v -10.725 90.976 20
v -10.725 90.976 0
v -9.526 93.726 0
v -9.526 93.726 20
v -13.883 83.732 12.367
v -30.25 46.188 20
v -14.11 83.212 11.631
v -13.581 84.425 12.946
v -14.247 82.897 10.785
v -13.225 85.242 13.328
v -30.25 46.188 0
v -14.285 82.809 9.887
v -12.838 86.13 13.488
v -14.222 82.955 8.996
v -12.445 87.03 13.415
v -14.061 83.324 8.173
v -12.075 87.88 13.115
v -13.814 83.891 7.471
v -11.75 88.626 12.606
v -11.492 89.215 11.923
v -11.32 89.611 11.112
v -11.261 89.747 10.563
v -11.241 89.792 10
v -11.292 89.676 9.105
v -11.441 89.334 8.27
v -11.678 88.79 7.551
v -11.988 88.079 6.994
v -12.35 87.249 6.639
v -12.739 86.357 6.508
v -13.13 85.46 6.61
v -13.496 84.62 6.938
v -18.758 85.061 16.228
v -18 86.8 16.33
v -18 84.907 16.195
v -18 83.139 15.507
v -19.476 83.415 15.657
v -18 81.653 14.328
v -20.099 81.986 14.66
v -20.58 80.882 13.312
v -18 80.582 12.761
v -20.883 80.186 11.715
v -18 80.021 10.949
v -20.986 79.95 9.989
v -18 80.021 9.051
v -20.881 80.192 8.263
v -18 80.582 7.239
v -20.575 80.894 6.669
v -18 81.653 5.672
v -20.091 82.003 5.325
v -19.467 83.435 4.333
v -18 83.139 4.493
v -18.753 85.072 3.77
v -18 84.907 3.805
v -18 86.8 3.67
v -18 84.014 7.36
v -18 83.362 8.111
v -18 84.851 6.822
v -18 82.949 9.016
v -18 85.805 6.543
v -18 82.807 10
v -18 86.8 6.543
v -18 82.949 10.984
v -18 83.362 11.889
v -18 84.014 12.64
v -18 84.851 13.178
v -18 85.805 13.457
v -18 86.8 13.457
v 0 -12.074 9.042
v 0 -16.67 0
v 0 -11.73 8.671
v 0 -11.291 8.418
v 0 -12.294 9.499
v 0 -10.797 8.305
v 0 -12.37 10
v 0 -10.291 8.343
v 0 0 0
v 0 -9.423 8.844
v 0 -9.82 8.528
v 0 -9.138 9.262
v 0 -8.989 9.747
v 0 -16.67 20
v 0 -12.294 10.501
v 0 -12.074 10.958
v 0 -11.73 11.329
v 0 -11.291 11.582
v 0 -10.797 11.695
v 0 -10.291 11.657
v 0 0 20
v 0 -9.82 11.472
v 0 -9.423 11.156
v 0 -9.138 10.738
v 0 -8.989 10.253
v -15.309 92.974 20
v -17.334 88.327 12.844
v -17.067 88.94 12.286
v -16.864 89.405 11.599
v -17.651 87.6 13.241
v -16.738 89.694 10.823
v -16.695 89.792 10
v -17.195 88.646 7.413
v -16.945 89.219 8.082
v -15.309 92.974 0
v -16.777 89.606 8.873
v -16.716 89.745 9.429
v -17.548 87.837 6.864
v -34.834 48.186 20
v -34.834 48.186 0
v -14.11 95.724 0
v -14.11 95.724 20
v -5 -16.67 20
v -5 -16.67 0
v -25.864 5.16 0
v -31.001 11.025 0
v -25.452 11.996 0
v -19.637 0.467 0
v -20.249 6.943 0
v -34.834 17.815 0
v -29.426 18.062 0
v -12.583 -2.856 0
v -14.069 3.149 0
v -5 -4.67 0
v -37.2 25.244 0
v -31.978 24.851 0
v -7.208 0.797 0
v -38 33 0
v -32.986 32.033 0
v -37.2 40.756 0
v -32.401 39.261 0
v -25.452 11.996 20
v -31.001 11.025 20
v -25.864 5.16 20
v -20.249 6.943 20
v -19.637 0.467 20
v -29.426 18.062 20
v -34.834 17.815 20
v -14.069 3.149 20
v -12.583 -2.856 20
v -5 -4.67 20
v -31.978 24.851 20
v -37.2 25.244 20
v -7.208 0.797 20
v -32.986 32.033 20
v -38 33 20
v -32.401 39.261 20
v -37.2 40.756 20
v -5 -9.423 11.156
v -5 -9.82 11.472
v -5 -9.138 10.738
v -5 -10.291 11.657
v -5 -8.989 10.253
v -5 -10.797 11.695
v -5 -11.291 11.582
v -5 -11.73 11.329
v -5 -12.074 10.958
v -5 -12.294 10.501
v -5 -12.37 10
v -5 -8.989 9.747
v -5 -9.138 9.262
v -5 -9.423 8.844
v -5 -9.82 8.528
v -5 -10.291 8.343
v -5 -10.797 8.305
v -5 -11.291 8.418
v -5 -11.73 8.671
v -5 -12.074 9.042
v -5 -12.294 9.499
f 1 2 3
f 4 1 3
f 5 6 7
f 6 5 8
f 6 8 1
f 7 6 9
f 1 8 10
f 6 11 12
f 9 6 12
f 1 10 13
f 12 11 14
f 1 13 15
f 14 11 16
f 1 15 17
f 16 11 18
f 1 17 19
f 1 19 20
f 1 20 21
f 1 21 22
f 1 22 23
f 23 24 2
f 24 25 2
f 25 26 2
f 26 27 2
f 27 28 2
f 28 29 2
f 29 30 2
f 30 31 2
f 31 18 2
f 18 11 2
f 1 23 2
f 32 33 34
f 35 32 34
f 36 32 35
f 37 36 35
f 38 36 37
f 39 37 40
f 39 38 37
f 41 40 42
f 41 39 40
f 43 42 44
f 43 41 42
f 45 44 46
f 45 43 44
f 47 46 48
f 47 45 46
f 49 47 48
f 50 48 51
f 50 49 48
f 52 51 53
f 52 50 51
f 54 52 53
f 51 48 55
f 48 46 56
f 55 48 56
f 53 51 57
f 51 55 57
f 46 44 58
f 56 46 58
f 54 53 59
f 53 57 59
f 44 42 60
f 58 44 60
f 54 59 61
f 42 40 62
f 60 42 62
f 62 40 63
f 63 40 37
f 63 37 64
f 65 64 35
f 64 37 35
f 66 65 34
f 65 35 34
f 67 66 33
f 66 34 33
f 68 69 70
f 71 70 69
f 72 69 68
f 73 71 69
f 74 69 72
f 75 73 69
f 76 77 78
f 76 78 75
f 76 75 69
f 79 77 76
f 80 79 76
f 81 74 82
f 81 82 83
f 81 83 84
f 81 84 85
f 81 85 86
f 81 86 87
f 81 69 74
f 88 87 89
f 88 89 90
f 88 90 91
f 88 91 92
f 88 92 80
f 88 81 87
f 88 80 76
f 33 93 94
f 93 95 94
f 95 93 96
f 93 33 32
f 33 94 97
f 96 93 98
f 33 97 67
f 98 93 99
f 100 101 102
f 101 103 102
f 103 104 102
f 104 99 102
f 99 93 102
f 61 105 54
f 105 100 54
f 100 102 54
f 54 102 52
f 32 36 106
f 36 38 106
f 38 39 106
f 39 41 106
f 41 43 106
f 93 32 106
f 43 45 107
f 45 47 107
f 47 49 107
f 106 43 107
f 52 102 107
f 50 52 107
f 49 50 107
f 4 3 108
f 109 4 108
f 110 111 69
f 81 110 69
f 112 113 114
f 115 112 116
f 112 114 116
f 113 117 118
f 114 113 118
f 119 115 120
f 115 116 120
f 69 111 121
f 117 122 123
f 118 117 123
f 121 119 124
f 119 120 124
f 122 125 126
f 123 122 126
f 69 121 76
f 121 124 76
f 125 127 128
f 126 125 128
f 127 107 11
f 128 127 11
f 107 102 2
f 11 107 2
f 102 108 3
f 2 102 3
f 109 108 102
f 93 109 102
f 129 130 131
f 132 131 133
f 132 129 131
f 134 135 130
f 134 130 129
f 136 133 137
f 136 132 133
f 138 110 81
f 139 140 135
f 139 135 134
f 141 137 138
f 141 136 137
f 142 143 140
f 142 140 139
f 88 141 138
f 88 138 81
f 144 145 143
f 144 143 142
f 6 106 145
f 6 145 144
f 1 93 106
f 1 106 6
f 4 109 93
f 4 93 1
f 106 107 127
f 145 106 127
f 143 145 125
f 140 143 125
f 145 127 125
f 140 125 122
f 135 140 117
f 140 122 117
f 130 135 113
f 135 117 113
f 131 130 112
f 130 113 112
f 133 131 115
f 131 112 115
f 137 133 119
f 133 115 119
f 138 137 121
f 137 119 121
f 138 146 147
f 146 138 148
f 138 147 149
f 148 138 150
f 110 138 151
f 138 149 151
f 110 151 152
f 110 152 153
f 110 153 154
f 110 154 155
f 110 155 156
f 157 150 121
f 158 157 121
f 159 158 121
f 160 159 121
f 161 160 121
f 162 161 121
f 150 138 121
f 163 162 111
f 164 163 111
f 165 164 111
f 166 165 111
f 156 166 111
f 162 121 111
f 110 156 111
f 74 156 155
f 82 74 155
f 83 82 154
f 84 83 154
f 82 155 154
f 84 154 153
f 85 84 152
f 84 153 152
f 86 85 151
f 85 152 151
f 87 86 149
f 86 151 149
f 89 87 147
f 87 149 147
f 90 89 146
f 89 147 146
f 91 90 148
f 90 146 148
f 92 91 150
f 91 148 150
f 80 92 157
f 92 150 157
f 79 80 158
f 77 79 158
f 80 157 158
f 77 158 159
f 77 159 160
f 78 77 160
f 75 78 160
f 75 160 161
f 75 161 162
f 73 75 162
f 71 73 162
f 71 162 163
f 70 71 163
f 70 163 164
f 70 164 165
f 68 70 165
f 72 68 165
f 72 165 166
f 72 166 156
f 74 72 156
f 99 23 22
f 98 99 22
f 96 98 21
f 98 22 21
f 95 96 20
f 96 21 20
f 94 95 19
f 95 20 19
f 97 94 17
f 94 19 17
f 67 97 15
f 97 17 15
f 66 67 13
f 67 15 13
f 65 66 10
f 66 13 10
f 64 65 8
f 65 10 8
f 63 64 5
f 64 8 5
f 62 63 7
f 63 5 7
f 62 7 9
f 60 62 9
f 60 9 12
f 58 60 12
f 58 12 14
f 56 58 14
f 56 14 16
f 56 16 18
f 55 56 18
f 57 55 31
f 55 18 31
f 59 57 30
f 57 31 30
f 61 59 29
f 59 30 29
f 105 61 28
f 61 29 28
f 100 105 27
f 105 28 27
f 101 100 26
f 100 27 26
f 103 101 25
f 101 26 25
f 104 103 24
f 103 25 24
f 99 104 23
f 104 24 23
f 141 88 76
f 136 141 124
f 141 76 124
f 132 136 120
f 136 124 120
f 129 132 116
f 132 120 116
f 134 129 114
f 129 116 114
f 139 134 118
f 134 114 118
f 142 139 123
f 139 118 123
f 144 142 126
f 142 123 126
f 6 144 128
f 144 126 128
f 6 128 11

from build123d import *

# Parameters (mm, degrees)
F1_DEPTH  = 20
F2_R      = 3.4925
F3_DEPTH  = 50
F5_R      = 6.35
F5_R_2    = 3.4925
F6_DEPTH  = 7
F7_W      = 56.608487
F7_H      = 135.039326
F8_DEPTH  = 25
F9_R      = 1.7
F10_DEPTH = 25
F12_DEPTH = 25
F14_DEPTH = 20


with BuildPart() as f1:
    # F0 (on Top) → F1 (new body)
    with BuildSketch(Plane.XY):
        with BuildLine():
            ThreePointArc((15.308536, 92.973734), (0, 103), (-15.308536, 92.973734))
            Line((-15.308536, 92.973734), (-34.833795, 48.185741))
            ThreePointArc((-34.833795, 48.185741), (-33.092371, 14.321269), (-5, -4.669616))
            Line((-5, -4.669616), (-5, -16.669616))
            Line((-5, -16.669616), (0, -16.669616))
            Line((0, -16.669616), (0, -5))
            ThreePointArc((0, -5), (31.78882, 12.180036), (34.833795, 48.185741))
            Line((34.833795, 48.185741), (15.308536, 92.973734))
        make_face()
        with BuildLine():
            ThreePointArc((-10.725142, 90.97561), (0, 98), (10.725142, 90.97561))
            Line((10.725142, 90.97561), (30.250401, 46.187617))
            ThreePointArc((30.250401, 46.187617), (0, 0), (-30.250401, 46.187617))
            Line((-30.250401, 46.187617), (-10.725142, 90.97561))
        make_face(mode=Mode.SUBTRACT)
    extrude(amount=F1_DEPTH)

    # F2 (on Right) → F3 (cut, symmetric)
    with BuildSketch(Plane.YZ):
        with Locations((86.3, 10)):
            Circle(F2_R)
    extrude(amount=F3_DEPTH, both=True, mode=Mode.SUBTRACT)

    # F5 (on offset) → F6 (cut)
    with BuildSketch(Plane.YZ.offset(-25)):
        with Locations((86.3, 10)):
            Circle(F5_R)
        with Locations((86.3, 10)):
            Circle(F5_R_2, mode=Mode.SUBTRACT)
    extrude(amount=F6_DEPTH, mode=Mode.SUBTRACT)

    # F7 (on face) → F8 (cut)
    with BuildSketch(Plane.XY.offset(20)):
        with Locations((28.304243, 38.84458)):
            Rectangle(F7_W, F7_H)
    extrude(amount=-F8_DEPTH, mode=Mode.SUBTRACT)

    # F9 (on face) → F10 (cut)
    with BuildSketch(Plane(origin=(-5, 0, 0), x_dir=(0, -1, 0), z_dir=(-1, 0, 0))):
        with Locations((10.669616, 10)):
            Circle(F9_R)
    extrude(amount=-F10_DEPTH, mode=Mode.SUBTRACT)

    # F11 (on face) → F12 (cut)
    with BuildSketch(Plane.XY.offset(20)):
        Polygon((-17.911747, 98.920211), (-15.308536, 92.973734), (-10.725142, 90.97561), (6.21896, 97.293422), (0, 104.071707), align=None)
    extrude(amount=-F12_DEPTH, mode=Mode.SUBTRACT)

    # F13 (on Top) → F14 (join)
    with BuildSketch(Plane.XY):
        Polygon((-14.109662, 95.72377), (-15.308536, 92.973734), (-10.725142, 90.97561), (-9.526268, 93.725646), align=None)
    extrude(amount=F14_DEPTH)


solid = f1.part
